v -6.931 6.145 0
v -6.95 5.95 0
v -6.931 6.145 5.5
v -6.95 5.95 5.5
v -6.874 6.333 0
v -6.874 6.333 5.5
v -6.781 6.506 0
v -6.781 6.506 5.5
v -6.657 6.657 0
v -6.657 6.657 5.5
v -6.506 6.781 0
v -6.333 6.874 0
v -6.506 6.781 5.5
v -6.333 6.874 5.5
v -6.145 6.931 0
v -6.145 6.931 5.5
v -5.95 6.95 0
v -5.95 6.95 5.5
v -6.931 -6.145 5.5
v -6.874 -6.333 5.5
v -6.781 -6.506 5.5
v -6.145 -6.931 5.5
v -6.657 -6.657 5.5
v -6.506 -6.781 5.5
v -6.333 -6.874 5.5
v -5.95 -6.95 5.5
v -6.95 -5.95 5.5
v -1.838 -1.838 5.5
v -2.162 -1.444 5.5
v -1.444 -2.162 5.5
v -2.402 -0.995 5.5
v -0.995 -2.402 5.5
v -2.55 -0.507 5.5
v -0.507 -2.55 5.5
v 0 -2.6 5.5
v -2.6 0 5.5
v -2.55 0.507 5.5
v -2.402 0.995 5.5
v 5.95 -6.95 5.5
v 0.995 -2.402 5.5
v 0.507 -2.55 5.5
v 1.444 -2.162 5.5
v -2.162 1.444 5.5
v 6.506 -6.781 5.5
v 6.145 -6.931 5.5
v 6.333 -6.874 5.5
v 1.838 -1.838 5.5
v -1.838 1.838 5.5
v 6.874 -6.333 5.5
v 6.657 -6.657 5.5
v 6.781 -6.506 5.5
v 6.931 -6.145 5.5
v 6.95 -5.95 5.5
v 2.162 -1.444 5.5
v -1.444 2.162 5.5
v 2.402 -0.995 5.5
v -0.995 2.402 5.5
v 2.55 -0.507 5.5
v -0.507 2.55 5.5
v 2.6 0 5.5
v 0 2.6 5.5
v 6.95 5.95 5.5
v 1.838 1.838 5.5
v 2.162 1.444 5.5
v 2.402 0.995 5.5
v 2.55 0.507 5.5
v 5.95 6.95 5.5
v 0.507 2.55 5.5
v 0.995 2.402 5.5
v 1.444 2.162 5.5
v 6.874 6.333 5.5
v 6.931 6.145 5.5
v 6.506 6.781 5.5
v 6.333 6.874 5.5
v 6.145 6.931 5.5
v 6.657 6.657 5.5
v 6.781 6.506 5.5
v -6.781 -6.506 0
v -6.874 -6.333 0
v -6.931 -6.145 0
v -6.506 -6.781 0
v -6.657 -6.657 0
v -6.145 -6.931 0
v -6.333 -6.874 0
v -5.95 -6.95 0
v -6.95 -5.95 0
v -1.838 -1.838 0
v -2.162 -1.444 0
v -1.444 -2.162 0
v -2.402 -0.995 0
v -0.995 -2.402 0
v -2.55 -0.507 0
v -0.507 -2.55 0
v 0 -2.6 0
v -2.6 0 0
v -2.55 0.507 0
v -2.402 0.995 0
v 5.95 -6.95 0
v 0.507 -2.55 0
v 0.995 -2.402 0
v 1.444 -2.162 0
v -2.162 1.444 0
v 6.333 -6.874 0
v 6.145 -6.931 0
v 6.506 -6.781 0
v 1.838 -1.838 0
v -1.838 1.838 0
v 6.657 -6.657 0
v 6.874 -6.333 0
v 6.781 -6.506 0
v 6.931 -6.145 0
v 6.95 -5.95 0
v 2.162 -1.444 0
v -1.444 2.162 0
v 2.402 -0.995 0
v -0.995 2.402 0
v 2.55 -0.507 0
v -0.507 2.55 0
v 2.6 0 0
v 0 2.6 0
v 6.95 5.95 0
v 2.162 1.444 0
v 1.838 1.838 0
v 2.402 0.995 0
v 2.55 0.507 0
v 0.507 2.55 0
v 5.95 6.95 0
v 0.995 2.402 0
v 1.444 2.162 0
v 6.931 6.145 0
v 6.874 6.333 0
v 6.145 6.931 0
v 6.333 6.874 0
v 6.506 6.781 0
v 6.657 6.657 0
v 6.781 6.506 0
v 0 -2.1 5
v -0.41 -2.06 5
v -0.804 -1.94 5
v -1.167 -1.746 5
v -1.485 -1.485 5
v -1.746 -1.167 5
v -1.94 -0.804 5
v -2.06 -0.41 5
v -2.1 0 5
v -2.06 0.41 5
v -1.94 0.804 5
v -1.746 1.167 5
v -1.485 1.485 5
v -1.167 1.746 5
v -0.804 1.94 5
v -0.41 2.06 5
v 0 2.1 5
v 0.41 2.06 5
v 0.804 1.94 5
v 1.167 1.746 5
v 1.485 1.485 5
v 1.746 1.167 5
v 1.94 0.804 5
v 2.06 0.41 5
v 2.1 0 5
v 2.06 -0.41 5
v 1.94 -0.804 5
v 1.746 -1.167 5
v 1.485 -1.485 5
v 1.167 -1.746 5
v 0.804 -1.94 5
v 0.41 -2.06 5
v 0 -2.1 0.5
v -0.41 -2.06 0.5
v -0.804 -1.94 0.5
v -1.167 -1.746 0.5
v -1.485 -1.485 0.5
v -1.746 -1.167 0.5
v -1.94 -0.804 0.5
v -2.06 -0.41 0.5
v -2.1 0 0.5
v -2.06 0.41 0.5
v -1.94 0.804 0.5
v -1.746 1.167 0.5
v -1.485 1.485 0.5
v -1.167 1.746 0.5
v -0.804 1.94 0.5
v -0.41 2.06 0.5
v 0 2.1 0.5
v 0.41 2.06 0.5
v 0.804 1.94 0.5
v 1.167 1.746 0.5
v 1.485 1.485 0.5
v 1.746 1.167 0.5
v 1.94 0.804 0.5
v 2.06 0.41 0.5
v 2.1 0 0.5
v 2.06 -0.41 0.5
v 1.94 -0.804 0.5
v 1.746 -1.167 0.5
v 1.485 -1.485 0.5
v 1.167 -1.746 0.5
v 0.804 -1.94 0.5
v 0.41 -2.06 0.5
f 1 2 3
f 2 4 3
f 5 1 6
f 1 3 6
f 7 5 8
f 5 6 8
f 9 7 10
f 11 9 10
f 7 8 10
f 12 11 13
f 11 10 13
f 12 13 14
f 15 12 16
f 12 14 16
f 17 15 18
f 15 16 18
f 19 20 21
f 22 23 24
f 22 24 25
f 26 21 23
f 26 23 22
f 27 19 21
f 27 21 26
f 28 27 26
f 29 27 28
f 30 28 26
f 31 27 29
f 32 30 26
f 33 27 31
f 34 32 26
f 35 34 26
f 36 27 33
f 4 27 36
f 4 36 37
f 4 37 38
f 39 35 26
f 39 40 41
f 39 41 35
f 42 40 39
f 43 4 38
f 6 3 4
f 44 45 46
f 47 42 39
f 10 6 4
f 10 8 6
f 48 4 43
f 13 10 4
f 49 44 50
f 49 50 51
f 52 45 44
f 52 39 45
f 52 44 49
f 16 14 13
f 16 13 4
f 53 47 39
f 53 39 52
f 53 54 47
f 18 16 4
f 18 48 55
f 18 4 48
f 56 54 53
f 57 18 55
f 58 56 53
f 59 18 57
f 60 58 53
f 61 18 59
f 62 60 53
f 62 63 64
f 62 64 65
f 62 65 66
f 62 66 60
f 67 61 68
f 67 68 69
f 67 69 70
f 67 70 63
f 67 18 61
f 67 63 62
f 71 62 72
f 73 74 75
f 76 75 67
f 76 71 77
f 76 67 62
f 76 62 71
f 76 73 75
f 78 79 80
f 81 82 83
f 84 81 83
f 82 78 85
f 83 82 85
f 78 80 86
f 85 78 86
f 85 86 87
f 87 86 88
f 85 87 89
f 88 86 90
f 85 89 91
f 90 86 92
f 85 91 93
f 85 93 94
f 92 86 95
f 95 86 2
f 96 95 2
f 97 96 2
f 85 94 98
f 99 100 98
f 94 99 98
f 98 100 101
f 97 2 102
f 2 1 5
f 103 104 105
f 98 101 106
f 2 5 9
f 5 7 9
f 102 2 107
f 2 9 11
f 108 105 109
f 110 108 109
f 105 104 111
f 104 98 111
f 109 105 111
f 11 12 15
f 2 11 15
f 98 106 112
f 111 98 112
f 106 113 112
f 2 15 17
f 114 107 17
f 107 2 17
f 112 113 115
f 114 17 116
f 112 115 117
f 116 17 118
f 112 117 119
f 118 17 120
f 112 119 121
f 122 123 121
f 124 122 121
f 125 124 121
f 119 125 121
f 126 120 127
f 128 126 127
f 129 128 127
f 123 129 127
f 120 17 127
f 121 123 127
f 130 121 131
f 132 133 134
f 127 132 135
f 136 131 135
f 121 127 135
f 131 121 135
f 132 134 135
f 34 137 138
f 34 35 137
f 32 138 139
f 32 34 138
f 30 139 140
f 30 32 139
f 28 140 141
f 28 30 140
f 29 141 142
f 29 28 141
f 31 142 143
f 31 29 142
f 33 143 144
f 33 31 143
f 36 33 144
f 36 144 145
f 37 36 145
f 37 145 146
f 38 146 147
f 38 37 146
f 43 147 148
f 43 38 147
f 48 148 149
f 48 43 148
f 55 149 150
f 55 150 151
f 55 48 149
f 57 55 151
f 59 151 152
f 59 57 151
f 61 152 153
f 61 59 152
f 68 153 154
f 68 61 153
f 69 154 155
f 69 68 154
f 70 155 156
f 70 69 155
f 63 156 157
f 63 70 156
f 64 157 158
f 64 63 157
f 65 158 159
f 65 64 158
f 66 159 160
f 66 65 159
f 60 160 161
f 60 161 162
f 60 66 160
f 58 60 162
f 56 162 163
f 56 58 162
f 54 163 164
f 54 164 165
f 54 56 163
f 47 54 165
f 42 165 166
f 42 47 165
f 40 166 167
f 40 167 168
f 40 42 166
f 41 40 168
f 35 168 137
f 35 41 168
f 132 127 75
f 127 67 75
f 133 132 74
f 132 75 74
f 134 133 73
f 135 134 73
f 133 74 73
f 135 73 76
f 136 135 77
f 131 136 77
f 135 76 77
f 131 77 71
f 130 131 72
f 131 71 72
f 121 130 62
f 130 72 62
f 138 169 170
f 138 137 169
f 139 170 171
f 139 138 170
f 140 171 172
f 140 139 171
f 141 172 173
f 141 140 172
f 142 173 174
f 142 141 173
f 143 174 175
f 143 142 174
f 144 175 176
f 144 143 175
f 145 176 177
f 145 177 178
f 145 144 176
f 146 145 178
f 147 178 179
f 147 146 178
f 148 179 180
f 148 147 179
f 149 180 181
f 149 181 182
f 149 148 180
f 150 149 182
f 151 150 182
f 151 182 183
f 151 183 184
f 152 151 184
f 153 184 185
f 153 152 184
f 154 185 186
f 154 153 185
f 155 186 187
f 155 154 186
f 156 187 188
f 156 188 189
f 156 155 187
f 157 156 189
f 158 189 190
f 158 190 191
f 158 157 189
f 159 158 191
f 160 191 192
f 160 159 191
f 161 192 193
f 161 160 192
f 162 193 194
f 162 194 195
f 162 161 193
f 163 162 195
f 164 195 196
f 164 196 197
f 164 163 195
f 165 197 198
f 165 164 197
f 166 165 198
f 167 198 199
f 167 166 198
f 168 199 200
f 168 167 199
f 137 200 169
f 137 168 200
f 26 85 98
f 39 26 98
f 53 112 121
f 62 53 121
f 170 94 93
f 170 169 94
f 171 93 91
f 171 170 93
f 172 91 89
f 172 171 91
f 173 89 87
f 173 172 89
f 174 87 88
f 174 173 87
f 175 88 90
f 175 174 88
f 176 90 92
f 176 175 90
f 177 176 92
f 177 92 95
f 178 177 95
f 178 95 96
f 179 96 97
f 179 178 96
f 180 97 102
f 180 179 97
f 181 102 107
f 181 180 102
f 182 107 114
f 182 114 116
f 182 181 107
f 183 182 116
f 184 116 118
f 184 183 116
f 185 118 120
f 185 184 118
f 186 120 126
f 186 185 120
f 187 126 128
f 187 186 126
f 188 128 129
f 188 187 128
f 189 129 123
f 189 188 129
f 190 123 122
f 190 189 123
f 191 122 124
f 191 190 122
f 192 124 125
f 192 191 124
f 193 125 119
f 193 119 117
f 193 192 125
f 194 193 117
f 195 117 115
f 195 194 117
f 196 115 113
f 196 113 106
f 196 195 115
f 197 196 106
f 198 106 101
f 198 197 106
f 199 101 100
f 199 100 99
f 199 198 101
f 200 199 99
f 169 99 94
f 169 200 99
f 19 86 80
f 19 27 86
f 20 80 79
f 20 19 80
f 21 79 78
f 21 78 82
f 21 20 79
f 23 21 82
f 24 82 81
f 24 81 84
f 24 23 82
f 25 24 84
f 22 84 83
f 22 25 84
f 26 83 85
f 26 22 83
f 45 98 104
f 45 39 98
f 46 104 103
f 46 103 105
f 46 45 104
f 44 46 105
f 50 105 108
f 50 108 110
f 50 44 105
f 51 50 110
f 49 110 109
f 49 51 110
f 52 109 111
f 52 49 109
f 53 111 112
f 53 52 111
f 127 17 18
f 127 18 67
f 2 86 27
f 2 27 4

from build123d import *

# Parameters (mm, degrees)
SKETCH_1_W      = 13.9
SKETCH_1_H      = 13.9
EXTRUDE_1_DEPTH = 5.5
FILLET_1_R      = 1


with BuildPart() as part:
    # Эскиз1 → Бобышка-Вытянуть1 (new body)
    with BuildSketch(Plane.XY):
        Rectangle(SKETCH_1_W, SKETCH_1_H)
    extrude(amount=EXTRUDE_1_DEPTH)

    # Эскиз3 → Отверстие обработанное метчиком M52 (revolve, cut)
    with BuildSketch(Plane(origin=(0, 0, 5.5), x_dir=(0, -1, 0), z_dir=(1, 0, 0))):
        Polygon((0, 0), (0, 5.5), (2.6, 5.5), (2.1, 5), (2.1, 0.5), (2.6, 0), align=None)
    revolve(axis=Axis((0, 0, 11.85), (0, 0, -1)), mode=Mode.SUBTRACT)

    # Скругление1
    fillet_1_edges = [part.edges().sort_by_distance(p)[0] for p in [
        (6.95, -6.95, 2.75),
        (-6.95, -6.95, 2.75),
        (-6.95, 6.95, 2.75),
        (6.95, 6.95, 2.75),
    ]]
    fillet(fillet_1_edges, radius=FILLET_1_R)


solid = part.part
